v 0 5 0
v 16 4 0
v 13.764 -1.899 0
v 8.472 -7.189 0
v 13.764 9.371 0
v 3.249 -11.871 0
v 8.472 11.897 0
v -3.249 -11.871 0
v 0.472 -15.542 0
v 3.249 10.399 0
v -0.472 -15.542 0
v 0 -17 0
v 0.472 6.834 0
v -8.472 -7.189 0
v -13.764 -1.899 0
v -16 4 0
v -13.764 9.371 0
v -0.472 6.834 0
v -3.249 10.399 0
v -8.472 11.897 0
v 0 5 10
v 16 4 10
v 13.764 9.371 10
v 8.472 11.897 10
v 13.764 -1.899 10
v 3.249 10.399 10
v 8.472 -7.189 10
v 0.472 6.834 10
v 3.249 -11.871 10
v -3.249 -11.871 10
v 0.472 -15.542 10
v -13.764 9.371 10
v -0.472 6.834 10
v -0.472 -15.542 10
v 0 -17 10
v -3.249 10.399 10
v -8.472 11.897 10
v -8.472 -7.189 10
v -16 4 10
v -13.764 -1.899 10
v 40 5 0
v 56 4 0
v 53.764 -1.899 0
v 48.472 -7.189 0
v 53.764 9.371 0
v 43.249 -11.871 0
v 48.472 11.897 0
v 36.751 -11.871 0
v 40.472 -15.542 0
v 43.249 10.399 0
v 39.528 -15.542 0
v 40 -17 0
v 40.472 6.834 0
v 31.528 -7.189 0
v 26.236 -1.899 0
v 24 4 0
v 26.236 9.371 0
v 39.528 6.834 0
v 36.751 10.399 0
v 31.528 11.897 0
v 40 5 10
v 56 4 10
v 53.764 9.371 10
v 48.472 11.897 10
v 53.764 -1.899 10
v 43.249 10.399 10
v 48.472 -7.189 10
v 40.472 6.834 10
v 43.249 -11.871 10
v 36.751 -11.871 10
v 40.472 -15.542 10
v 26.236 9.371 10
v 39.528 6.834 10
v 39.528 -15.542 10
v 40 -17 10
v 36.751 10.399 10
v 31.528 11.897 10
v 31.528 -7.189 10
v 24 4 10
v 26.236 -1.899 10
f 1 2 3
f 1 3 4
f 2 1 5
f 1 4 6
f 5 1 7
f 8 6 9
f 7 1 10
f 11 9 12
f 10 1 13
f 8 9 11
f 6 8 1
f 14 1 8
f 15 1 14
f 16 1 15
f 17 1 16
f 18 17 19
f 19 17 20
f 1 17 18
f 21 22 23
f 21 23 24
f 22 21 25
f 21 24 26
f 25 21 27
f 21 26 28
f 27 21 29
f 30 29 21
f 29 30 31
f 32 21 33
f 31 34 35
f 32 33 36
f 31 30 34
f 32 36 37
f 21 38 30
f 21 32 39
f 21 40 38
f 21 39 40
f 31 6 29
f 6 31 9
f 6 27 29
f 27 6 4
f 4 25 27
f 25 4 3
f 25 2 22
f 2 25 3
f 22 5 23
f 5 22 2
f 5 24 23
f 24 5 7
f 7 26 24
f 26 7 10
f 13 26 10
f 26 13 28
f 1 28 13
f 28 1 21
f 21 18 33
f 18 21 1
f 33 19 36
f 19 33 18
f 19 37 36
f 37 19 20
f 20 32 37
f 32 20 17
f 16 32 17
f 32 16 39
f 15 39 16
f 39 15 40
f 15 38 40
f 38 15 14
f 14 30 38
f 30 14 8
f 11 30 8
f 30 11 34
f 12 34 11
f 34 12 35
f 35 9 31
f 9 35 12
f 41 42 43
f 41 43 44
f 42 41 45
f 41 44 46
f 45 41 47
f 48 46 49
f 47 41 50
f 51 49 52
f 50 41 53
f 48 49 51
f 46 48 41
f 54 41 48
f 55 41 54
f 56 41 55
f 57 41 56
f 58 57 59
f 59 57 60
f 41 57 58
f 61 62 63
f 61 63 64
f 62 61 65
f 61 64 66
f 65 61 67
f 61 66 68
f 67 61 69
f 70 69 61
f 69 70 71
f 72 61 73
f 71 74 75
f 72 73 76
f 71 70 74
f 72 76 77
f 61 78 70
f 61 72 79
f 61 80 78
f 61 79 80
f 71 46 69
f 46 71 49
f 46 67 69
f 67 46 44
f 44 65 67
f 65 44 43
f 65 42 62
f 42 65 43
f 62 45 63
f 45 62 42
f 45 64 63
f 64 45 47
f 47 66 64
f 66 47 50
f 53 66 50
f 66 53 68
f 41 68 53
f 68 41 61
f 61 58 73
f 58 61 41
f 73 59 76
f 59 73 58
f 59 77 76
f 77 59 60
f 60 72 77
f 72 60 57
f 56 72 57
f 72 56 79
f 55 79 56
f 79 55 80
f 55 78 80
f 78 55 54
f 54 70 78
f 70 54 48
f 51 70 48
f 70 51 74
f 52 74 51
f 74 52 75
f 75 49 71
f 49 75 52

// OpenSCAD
module heart(h=10,n=20) {
    function heart_coordinates(t) = [16*pow(sin(t),3), 13*cos(t) - 5*cos(2*t) - 2*cos(3*t) - cos(4*t)];
    function heart_points(n=20) = [for(t=[0:360/n:359.999]) heart_coordinates(t)];
    points=heart_points(n=n);
    linear_extrude(height=h)
        polygon(points);
}
n=20;
h=10;
step=360/n;
function heart_coordinates(t) = [16*pow(sin(t),3), 13*cos(t) - 5*cos(2*t) - 2*cos(3*t) - cos(4*t)];
function heart_points(n=20) = [for(t=[0:360/n:359.999]) heart_coordinates(t)];
pointss=heart_points(n=n);
points=[for(t=[0:step:360.999]) [16*pow(sin(t),3), 13*cos(t) - 5*cos(2*t) - 2*cos(3*t) - cos(4*t)]];
linear_extrude(height=h)
    polygon(pointss);

point1=[for(i=[1:6]) i];
echo(point1);
point2=[for(i=[10:-2:-2]) i];
echo(point2);
point3=[for(i=[3:1:6]) [i,i*10]];
echo(point3);
translate([40,0,0])
    heart();
